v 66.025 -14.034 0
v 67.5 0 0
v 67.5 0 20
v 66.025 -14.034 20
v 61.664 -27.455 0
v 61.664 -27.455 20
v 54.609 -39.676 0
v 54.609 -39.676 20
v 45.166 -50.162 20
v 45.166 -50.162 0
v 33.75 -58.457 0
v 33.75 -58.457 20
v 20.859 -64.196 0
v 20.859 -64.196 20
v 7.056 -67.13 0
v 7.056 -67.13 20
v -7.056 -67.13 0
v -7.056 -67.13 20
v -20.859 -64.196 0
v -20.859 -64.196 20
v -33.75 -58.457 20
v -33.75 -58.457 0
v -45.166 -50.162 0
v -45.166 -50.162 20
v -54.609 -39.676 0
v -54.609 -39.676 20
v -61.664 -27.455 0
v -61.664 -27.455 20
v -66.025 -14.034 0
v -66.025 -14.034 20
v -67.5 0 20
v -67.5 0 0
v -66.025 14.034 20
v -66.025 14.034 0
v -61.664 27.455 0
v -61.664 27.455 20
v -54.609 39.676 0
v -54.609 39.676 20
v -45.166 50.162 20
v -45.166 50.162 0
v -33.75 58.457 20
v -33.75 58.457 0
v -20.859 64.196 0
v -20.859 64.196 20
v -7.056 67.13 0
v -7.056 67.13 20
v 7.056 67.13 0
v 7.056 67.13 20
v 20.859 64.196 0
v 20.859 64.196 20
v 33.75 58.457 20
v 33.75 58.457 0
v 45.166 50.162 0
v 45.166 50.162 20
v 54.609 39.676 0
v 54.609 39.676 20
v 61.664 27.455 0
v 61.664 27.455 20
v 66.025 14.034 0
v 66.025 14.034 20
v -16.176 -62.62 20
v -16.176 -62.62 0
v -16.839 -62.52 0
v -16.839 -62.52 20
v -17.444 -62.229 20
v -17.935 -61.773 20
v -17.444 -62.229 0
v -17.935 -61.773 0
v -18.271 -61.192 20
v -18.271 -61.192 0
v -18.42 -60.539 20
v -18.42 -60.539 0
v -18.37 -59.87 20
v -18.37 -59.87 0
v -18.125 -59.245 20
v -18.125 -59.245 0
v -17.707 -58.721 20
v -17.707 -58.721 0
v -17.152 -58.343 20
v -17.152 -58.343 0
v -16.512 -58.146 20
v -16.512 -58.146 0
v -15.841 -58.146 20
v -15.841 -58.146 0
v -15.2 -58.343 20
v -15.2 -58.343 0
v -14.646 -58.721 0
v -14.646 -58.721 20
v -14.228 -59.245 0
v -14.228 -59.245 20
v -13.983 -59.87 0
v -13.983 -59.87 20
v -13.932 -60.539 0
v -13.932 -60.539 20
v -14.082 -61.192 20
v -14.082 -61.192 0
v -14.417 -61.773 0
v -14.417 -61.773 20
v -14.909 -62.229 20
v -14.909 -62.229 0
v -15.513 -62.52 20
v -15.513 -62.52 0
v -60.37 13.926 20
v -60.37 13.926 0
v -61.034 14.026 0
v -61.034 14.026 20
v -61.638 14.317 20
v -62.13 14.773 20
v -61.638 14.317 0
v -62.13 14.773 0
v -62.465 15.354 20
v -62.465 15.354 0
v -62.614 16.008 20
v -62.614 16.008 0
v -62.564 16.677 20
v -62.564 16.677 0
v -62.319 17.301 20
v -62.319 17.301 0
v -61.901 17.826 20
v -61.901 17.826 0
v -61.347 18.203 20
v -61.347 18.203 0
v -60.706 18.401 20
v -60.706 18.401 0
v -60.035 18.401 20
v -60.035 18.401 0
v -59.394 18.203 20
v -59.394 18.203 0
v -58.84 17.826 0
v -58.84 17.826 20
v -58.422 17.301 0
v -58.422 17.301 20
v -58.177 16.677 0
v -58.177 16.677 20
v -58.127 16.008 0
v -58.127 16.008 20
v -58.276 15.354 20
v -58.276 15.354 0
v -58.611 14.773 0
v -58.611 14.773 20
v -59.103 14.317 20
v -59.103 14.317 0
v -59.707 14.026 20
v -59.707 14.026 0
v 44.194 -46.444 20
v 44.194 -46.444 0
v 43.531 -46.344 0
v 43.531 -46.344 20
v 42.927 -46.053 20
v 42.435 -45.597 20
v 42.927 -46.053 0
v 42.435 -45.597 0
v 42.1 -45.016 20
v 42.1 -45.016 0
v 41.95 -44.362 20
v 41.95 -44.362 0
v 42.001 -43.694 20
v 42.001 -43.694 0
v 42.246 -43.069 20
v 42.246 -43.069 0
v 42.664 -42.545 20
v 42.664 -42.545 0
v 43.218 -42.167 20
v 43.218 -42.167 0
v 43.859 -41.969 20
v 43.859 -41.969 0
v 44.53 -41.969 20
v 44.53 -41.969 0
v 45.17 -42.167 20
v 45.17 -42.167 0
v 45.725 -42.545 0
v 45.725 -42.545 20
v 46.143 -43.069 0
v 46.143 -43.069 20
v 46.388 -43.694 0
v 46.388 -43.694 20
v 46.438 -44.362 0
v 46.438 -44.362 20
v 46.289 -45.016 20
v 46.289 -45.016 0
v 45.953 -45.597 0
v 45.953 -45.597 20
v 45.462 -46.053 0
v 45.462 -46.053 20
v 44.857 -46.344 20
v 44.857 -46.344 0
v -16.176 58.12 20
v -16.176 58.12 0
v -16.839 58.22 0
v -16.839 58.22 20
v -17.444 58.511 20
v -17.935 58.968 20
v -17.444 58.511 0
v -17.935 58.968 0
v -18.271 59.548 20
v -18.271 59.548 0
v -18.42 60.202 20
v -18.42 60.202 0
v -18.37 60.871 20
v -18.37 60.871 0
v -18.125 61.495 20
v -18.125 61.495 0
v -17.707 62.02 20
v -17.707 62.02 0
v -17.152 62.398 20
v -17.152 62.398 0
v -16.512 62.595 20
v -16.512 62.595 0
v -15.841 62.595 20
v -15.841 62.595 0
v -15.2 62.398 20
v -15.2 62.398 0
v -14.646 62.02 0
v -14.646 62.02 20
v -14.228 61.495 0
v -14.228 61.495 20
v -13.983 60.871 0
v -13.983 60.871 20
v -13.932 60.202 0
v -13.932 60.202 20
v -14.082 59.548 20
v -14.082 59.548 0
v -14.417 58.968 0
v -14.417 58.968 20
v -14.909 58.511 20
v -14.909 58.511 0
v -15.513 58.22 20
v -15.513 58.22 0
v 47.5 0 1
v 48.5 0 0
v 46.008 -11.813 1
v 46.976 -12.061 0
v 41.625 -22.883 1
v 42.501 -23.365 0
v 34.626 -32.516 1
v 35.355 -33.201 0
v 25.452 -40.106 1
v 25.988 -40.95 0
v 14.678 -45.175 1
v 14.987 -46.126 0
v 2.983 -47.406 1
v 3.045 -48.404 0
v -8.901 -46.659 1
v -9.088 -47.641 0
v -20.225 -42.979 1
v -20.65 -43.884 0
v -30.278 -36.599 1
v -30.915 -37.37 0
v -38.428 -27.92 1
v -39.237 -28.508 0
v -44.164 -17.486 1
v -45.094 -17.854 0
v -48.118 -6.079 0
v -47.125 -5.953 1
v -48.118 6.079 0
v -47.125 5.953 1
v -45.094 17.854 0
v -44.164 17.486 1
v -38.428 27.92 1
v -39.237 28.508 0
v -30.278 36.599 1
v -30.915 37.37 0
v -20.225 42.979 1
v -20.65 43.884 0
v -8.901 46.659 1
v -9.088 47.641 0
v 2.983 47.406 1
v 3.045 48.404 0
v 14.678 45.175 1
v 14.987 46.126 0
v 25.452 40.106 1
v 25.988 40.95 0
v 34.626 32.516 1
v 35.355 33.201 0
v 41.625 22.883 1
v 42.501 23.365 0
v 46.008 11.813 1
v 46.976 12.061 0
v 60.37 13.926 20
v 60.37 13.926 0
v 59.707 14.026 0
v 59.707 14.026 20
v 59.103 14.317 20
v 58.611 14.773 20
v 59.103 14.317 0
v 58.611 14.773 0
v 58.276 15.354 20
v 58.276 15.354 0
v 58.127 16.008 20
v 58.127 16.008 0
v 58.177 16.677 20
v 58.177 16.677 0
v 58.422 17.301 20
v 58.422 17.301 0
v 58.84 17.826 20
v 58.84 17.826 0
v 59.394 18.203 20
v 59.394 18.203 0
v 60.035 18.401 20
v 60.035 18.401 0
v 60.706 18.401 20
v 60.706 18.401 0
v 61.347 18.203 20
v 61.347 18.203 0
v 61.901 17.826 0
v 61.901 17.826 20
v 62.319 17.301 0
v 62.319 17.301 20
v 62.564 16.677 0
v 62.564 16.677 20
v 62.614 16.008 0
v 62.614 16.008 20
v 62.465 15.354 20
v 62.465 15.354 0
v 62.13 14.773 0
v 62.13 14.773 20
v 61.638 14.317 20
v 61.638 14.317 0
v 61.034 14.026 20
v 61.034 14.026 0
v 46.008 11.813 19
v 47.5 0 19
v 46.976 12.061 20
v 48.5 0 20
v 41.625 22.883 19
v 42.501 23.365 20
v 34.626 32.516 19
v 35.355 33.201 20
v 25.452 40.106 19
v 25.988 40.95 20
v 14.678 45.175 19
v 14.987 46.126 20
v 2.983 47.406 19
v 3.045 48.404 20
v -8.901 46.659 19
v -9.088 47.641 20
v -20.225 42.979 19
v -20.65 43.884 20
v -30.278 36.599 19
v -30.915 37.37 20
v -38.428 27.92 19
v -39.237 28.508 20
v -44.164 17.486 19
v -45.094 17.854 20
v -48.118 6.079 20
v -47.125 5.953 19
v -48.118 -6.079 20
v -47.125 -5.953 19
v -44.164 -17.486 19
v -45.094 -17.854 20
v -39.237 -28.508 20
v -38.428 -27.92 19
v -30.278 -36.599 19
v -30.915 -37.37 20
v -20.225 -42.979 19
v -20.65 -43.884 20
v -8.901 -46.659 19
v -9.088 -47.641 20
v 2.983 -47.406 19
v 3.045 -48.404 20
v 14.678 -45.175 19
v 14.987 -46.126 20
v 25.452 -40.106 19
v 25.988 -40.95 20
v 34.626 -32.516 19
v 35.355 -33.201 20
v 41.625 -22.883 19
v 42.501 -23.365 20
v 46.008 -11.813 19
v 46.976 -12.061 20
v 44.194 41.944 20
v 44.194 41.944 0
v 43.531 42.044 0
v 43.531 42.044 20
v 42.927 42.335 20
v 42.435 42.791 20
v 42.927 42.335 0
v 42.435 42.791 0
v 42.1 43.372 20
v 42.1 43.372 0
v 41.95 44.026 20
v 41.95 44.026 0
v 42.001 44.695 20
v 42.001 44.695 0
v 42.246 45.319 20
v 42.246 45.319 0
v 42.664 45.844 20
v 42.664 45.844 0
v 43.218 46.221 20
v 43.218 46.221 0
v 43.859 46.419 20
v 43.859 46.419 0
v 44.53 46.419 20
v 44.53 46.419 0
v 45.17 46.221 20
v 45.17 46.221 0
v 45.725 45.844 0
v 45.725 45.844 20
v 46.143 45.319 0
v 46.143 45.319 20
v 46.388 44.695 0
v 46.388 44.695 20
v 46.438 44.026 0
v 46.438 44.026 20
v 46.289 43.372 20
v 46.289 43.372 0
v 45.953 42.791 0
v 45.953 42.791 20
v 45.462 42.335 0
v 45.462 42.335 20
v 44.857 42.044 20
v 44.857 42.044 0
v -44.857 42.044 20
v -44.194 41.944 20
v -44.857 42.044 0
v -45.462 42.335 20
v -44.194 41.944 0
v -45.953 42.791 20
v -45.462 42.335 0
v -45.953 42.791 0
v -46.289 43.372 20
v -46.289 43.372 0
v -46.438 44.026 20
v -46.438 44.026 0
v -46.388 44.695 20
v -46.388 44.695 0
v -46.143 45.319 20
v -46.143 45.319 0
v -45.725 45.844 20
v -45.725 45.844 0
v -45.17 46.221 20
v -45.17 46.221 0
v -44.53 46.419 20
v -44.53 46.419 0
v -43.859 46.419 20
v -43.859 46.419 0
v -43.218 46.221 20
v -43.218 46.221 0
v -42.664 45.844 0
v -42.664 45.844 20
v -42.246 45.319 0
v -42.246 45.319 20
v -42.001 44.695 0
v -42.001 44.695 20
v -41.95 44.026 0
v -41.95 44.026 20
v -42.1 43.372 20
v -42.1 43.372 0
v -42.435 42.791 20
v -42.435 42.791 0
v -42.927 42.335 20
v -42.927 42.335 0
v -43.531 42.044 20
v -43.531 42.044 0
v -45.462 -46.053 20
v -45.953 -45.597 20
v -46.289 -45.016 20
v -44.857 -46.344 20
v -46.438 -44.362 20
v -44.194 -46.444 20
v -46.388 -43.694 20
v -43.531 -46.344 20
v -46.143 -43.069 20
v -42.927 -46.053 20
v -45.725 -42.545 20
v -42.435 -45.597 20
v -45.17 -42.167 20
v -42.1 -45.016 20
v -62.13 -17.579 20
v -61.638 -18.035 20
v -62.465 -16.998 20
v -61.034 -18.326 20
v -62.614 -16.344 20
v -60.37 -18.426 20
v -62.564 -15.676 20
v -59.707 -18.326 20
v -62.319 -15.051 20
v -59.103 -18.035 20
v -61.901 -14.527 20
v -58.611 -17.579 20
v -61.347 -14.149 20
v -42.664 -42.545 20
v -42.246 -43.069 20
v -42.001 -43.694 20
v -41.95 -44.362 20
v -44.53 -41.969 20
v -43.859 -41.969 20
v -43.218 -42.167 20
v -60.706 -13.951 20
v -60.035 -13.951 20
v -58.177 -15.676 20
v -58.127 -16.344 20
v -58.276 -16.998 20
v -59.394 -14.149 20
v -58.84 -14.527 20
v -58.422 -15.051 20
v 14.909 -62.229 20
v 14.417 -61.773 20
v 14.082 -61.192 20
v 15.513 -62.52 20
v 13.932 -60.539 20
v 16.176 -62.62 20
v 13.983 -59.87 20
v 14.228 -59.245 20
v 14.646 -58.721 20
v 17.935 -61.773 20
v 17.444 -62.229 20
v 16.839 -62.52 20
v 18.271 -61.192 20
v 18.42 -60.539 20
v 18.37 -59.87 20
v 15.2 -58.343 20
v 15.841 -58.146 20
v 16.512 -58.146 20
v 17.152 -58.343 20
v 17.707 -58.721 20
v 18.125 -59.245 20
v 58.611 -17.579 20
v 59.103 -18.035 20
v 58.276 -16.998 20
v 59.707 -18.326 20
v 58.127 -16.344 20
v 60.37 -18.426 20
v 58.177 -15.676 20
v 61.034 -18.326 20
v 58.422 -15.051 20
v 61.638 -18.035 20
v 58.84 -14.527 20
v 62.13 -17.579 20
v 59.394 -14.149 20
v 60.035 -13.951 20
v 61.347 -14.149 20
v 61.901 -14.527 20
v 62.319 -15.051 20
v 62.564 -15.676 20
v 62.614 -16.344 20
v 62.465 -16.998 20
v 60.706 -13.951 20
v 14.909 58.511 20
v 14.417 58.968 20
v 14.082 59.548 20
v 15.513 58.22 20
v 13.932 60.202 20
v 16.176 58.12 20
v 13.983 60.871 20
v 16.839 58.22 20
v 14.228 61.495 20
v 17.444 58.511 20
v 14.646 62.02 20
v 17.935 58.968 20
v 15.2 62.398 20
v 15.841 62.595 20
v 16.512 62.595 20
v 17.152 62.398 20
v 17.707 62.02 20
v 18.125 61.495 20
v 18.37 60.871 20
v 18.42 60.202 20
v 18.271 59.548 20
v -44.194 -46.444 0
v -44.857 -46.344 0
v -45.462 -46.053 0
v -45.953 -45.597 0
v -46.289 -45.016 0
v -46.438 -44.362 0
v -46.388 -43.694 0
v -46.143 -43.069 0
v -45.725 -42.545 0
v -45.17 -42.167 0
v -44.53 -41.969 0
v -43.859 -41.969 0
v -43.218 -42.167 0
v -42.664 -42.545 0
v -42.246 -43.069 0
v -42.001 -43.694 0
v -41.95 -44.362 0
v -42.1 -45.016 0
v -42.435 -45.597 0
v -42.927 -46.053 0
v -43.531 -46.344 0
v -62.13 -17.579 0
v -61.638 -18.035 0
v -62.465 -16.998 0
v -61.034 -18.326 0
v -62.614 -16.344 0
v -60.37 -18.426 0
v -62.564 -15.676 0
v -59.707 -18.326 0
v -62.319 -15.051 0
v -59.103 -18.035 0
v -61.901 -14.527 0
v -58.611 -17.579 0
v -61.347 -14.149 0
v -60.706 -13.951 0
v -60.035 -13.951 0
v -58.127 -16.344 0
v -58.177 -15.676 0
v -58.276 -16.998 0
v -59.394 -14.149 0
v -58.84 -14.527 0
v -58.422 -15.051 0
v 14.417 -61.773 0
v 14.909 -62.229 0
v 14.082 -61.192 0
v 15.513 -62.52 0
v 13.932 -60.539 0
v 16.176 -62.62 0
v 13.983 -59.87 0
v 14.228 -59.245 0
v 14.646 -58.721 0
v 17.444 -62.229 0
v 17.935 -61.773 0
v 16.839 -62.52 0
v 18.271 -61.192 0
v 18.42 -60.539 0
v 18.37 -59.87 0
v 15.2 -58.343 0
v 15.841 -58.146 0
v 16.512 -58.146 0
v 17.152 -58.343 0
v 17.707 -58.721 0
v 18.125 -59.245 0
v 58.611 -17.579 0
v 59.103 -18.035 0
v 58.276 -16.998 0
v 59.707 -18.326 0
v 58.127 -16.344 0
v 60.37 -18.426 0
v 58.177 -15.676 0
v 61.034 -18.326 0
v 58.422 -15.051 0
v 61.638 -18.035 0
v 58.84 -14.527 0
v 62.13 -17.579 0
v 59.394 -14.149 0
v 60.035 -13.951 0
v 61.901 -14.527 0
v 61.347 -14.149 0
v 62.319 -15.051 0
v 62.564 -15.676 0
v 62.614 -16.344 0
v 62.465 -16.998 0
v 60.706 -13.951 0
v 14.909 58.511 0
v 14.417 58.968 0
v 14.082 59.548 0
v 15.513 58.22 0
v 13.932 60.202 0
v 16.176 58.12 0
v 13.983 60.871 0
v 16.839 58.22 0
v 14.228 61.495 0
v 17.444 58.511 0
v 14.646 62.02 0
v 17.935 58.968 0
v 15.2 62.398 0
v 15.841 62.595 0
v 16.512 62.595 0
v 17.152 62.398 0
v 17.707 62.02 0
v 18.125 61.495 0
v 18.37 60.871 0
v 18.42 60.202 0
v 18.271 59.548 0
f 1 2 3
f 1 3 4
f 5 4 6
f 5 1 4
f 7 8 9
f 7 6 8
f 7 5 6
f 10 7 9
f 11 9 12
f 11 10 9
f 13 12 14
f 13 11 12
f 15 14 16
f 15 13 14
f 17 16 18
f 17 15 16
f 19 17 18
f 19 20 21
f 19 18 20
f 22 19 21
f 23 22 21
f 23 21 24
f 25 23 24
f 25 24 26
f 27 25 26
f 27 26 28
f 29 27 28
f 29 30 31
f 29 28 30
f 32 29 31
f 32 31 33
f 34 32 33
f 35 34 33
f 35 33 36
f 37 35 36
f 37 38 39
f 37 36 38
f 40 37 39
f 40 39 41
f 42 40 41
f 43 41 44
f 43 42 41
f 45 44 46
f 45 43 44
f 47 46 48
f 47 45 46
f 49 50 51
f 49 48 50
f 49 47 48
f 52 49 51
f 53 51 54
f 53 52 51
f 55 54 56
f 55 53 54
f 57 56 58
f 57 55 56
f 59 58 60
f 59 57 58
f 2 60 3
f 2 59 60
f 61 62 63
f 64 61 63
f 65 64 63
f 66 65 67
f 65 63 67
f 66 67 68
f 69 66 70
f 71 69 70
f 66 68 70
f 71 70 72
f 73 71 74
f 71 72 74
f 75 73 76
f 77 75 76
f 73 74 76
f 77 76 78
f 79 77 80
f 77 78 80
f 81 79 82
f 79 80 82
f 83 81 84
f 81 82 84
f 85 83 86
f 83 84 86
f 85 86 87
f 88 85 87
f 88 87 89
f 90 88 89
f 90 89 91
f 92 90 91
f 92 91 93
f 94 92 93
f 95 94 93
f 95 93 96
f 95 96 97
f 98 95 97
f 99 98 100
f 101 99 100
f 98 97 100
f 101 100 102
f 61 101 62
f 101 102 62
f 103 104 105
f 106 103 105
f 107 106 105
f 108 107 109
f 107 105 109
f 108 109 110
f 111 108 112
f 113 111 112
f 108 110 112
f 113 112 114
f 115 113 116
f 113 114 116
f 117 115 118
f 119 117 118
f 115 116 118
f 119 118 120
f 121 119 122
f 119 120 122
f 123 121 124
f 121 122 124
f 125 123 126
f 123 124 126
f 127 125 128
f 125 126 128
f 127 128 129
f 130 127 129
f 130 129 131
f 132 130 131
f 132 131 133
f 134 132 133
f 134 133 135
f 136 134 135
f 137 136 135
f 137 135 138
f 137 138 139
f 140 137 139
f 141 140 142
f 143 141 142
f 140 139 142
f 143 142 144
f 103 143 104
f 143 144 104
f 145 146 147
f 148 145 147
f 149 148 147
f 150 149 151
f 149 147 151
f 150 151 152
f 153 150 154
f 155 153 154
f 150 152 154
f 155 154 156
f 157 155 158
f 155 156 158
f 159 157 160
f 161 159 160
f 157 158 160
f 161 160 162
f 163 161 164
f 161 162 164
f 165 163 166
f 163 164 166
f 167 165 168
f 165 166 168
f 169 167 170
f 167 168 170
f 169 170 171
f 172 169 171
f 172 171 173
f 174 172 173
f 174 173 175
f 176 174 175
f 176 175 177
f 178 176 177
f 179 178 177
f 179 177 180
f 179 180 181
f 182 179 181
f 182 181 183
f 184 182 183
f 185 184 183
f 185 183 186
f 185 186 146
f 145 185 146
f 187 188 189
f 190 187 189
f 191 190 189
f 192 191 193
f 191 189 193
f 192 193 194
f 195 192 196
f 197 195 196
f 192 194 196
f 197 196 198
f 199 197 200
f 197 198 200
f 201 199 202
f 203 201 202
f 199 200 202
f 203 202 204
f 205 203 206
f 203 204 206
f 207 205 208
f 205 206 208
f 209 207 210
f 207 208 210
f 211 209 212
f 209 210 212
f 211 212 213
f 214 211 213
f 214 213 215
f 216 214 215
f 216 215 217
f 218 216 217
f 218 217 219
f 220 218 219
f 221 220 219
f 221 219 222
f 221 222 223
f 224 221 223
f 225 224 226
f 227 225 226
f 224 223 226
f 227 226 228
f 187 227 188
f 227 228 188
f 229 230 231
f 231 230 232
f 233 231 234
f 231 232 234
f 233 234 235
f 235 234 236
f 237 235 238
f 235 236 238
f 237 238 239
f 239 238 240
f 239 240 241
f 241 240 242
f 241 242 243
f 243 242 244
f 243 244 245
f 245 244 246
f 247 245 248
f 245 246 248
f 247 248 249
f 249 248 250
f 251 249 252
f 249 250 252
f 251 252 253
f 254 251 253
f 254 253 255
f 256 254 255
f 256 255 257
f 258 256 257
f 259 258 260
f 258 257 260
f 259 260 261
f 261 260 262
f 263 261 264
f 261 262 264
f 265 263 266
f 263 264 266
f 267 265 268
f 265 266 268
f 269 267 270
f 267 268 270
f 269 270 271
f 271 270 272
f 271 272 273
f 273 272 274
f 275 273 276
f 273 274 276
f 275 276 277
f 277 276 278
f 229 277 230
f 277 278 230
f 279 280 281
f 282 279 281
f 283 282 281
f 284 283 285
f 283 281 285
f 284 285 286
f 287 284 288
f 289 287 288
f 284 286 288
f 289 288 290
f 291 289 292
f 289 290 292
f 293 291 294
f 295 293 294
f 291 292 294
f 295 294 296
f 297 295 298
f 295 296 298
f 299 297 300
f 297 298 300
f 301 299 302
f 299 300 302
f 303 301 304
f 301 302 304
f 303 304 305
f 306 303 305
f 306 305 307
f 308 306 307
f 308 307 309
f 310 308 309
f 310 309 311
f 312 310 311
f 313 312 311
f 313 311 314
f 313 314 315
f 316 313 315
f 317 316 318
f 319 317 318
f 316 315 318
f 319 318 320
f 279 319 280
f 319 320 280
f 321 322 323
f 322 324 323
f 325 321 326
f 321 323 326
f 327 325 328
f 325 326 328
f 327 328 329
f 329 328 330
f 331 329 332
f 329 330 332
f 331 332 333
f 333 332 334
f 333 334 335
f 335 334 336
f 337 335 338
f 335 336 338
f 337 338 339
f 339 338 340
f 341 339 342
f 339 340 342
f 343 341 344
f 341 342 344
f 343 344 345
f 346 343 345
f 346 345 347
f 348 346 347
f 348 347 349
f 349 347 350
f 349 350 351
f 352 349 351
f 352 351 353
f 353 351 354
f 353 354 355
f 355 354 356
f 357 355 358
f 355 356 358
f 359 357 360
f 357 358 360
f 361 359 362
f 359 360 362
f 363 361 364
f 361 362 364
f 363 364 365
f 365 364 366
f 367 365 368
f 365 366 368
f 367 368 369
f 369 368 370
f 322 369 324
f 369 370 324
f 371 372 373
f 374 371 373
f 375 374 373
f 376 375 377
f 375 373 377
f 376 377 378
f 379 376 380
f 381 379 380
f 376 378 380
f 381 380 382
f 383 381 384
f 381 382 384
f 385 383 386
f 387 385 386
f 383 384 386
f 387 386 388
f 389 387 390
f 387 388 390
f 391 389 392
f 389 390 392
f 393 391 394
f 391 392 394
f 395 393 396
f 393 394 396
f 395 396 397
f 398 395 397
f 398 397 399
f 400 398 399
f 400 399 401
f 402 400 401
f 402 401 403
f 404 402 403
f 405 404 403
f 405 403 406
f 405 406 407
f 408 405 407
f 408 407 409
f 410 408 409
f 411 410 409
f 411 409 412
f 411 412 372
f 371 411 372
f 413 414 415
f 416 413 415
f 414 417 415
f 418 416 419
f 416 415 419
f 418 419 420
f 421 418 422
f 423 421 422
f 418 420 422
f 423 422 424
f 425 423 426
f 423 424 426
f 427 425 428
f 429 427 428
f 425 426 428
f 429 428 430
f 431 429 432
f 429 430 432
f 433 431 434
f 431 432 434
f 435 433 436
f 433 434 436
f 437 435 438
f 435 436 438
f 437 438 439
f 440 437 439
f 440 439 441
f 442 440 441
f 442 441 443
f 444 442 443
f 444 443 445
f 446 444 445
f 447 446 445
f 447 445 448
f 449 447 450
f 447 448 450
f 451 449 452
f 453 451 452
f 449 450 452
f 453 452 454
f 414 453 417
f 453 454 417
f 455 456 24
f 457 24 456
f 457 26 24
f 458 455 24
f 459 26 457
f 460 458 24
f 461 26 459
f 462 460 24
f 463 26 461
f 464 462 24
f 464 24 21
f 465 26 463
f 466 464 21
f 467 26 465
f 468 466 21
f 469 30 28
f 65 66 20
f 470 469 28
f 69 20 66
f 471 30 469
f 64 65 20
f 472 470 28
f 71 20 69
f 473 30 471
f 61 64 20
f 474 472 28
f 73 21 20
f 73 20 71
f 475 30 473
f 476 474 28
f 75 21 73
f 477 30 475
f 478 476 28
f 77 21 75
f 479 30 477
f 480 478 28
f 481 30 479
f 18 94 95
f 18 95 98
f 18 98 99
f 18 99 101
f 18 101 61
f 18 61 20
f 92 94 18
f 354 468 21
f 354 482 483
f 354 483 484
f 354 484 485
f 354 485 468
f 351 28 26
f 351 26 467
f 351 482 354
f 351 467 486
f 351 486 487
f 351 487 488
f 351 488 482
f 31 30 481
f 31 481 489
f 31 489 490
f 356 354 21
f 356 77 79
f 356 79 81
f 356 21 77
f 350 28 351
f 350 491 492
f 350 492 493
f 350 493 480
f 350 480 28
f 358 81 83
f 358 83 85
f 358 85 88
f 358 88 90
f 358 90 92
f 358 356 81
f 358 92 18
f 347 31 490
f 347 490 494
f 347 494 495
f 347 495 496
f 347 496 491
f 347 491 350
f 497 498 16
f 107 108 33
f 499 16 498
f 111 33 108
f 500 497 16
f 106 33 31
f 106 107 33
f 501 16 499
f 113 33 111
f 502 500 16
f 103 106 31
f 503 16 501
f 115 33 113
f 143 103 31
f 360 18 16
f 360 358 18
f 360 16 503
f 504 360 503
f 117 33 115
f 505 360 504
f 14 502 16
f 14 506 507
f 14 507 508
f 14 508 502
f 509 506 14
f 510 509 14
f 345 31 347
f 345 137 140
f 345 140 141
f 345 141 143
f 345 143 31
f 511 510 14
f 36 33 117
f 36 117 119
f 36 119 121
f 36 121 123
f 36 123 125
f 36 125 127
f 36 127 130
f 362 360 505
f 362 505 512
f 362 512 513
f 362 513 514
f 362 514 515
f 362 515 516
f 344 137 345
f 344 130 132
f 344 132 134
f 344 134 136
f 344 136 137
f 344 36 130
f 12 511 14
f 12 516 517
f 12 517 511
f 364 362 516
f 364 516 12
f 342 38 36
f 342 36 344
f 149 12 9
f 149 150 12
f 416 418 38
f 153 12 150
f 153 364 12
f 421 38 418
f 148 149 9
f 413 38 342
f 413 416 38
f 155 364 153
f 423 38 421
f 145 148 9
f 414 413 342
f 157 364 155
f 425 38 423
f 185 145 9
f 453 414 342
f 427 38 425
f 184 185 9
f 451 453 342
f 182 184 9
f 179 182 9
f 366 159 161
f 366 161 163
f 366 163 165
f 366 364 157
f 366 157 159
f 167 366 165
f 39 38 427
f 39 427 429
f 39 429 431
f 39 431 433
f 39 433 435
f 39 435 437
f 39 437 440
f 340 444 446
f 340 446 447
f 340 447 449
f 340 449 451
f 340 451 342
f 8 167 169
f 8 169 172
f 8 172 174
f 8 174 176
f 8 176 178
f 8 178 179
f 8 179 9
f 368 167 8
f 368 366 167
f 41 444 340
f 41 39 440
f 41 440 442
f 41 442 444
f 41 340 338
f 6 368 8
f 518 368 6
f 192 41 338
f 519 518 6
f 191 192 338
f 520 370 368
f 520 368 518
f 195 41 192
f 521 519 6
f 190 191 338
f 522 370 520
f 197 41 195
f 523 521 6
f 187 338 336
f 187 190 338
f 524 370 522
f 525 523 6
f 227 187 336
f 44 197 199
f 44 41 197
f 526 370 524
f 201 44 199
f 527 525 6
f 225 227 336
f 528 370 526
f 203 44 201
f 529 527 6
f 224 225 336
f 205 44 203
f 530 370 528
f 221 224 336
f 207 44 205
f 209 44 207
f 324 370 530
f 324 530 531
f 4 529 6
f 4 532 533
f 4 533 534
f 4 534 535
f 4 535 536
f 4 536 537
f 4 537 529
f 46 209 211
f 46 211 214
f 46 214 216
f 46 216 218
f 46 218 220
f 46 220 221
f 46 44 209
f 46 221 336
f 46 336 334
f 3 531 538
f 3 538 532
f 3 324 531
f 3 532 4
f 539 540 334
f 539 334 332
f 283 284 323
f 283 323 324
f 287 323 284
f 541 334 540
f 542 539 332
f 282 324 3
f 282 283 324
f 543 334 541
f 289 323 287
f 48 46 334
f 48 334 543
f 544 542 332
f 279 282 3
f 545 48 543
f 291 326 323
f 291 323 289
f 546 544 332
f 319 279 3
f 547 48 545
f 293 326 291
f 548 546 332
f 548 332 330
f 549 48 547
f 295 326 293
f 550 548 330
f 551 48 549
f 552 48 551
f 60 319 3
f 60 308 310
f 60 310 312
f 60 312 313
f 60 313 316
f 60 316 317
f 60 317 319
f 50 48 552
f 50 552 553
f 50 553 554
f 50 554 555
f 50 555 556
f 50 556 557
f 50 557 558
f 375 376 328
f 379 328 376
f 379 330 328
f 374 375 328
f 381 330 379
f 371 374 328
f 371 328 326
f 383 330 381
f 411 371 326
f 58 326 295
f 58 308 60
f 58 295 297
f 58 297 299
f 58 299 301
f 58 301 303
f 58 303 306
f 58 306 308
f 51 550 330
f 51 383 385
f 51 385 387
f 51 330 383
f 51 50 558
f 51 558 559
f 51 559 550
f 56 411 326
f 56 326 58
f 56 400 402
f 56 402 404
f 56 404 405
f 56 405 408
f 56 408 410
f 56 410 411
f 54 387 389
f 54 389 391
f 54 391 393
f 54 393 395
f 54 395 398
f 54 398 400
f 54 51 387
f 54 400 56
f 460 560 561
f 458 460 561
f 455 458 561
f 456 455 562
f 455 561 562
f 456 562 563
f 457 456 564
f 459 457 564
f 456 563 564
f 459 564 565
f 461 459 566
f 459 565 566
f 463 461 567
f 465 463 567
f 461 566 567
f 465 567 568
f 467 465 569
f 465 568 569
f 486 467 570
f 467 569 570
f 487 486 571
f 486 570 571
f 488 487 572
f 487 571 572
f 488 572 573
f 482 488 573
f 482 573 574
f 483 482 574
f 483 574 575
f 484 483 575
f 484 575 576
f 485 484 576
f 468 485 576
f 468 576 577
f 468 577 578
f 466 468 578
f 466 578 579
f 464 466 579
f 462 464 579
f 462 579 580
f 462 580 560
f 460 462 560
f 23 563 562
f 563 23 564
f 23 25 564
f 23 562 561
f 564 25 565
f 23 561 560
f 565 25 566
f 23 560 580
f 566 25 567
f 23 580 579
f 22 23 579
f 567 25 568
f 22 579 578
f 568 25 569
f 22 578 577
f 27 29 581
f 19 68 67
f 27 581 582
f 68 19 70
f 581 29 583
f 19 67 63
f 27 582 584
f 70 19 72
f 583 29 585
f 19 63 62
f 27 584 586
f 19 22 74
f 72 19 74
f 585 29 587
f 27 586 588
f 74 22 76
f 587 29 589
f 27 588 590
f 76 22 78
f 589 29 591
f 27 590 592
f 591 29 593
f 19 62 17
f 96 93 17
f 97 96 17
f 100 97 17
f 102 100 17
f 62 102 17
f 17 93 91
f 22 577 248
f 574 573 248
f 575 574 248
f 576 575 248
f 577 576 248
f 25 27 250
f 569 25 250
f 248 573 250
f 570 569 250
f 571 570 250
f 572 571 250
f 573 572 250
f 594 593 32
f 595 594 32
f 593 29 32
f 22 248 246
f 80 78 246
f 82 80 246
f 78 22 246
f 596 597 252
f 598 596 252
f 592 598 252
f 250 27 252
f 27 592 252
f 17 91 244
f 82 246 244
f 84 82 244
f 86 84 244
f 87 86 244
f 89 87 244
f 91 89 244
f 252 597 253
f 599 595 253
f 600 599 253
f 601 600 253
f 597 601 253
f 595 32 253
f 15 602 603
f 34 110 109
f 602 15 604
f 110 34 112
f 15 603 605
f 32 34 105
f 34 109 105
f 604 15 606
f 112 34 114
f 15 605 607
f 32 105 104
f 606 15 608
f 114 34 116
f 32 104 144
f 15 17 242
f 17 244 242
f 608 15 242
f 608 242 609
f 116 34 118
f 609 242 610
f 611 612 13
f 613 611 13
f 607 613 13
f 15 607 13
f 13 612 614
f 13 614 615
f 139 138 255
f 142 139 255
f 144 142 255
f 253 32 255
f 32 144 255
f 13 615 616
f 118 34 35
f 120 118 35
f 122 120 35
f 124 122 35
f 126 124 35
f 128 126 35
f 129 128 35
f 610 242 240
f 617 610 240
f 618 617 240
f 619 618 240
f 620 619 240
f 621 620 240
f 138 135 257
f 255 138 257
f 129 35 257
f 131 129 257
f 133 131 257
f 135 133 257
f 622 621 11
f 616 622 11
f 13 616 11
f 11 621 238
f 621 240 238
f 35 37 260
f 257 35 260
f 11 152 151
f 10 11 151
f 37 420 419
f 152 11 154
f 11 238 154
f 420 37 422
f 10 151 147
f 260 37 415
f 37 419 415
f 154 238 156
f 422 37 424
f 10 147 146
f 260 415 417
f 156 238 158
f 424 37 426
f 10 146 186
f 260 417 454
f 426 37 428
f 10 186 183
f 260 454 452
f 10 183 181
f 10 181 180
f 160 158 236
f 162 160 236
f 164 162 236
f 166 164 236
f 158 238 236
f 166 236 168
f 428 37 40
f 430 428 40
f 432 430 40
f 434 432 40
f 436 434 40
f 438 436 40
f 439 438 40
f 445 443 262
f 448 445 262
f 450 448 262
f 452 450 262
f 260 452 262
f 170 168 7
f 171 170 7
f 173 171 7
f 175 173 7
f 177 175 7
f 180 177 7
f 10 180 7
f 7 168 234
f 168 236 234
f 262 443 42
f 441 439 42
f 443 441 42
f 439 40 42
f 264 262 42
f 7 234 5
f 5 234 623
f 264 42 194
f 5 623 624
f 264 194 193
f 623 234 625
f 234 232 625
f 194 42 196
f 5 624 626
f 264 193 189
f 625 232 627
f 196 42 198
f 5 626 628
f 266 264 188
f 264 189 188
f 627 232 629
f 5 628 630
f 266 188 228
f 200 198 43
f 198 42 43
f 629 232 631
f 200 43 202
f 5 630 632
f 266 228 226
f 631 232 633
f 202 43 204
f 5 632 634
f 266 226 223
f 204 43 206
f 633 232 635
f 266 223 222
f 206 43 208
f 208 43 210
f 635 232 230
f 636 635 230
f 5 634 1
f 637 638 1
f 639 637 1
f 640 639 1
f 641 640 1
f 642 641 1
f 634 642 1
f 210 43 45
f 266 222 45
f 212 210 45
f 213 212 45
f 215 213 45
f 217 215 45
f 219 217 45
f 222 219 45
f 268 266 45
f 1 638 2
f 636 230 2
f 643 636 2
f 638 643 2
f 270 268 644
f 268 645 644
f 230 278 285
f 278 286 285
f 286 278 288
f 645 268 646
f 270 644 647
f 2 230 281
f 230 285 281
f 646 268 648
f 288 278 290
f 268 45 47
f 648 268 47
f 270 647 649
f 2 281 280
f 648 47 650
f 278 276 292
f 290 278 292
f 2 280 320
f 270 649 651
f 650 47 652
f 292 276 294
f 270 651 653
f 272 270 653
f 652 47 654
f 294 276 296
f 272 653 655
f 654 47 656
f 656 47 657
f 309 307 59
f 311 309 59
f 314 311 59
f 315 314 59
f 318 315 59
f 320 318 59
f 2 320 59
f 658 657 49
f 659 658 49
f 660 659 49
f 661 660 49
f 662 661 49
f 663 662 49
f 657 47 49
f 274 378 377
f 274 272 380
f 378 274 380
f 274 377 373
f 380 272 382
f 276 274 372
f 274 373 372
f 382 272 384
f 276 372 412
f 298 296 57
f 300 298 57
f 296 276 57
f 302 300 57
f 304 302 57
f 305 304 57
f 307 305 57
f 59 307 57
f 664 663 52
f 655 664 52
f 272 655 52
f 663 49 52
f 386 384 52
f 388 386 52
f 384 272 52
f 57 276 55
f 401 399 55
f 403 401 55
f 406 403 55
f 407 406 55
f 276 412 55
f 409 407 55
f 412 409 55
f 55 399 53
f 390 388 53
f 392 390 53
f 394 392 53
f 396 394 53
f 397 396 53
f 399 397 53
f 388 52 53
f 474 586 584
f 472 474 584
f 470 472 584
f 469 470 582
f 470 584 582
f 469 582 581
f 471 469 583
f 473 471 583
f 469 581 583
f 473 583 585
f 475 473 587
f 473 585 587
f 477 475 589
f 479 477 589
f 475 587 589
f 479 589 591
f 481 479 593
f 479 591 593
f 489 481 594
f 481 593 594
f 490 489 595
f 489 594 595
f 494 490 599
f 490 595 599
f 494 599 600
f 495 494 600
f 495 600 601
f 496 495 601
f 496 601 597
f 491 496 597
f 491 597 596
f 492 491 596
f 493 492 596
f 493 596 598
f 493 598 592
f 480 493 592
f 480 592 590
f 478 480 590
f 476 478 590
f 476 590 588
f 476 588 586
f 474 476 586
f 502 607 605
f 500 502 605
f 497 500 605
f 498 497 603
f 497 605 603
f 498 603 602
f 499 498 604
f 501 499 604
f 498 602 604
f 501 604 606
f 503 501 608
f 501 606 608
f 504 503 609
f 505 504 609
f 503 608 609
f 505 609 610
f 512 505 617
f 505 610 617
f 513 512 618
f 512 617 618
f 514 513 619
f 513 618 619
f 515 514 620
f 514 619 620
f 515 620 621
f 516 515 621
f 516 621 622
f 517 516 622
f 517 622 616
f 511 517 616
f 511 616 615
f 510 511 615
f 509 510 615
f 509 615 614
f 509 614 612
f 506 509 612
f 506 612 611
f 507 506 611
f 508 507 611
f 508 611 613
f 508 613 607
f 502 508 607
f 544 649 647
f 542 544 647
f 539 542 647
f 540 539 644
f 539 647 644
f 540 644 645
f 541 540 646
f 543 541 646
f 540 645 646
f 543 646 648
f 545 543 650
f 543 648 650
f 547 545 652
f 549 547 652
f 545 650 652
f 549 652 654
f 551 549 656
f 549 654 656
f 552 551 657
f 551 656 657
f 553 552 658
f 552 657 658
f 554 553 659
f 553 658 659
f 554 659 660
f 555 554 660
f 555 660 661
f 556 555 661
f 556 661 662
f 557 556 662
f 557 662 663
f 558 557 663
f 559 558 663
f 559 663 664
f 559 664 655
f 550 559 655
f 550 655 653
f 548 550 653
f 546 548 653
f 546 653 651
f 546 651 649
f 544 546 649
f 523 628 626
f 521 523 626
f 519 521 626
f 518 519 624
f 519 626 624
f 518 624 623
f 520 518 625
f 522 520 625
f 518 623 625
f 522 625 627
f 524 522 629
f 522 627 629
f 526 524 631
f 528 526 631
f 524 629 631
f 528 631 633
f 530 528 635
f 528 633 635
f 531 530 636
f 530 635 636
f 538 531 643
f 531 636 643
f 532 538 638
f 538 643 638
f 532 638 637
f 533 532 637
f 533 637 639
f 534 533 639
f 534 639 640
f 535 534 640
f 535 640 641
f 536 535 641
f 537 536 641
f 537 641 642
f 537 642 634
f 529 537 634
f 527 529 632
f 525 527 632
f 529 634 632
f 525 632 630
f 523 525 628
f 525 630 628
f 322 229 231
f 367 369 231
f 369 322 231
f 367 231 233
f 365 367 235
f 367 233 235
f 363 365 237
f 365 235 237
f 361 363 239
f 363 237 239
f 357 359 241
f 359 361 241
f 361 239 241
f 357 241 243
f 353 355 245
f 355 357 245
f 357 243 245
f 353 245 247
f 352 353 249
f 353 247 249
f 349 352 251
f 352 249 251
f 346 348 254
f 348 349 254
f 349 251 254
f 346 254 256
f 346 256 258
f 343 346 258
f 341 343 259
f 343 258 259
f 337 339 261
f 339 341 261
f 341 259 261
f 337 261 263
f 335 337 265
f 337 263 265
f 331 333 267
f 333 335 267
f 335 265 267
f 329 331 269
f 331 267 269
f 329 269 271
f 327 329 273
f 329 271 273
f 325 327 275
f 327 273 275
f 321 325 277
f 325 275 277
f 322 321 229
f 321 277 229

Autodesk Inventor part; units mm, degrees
ref_plane "YZ Plane" through (0, 0, 0) normal (1, 0, 0) x (0, 1, 0)
ref_plane "XZ Plane" through (0, 0, 0) normal (0, 1, 0) x (-1, 0, 0)
ref_plane "XY Plane" through (0, 0, 0) normal (0, 0, 1) x (1, 0, 0)
sketch "スケッチ1" plane through (0, 0, 0) normal (0, 0, 1) x (1, 0, 0)
  circle A0 centre (0, 0) radius 47.5
  circle A1 centre (0, 0) radius 67.5
  dimension "d0" = 95
  dimension "d1" = 135
extrude "押し出し1" add sketch "スケッチ1" along normal blind 20
sketch "スケッチ2" plane through (0, 0, 20) normal (0, 0, 1) x (1, 0, 0)
  circle A0 centre (0, 0) radius 62.5
  point P0 (16.1762, 60.3704)
  point P1 (-16.1762, 60.3704)
  point P2 (-44.1942, 44.1942)
  point P3 (-60.3704, 16.1762)
  point P4 (-60.3704, -16.1762)
  point P5 (-44.1942, -44.1942)
  point P6 (-16.1762, -60.3704)
  point P7 (16.1762, -60.3704)
  point P8 (44.1942, -44.1942)
  point P9 (60.3704, -16.1762)
  point P10 (60.3704, 16.1762)
  point P11 (44.1942, 44.1942)
  dimension "d4" = 125
  dimension "d7" = 360
  dimension "d25" = 0
hole "穴1" at (16.1762, 60.3704, 20) at (-16.1762, 60.3704, 20) at (-44.1942, 44.1942, 20) at (-60.3704, 16.1762, 20) at (-60.3704, -16.1762, 20) at (-44.1942, -44.1942, 20) at (-16.1762, -60.3704, 20) at (16.1762, -60.3704, 20) at (44.1942, -44.1942, 20) at (60.3704, -16.1762, 20) at (60.3704, 16.1762, 20) at (44.1942, 44.1942, 20) direction (0, 0, -1) diameter 4.5 end through all clearance for "Flat Head Machine Screw" size "M4" standard "Ansi Metric M Profile"
chamfer "面取り1" distance 1 angle 45 2 edges at (-47.5, 0, 20) (-47.5, 0, 0)
sketch "スケッチ3" plane through (0, 0, 20) normal (0, 0, 1) x (1, 0, 0)
  circle A0 centre (16.1762, 60.3704) radius 2.25 projected
  circle A1 centre (-16.1762, 60.3704) radius 2.25 projected
  circle A2 centre (0, 0) radius 67.5 projected
  circle A3 centre (-16.1762, 60.3704) radius 5
  circle A4 centre (16.1762, 60.3704) radius 5
  circle A5 centre (0, 0) radius 62.5
  point P0 (-11.2987, 61.4702)
  point P1 (11.2987, 61.4702)
  point P2 (17.4703, 65.2)
  point P3 (-17.4703, 65.2)
properties part number "unit-base3" material "ABS プラスチック"
